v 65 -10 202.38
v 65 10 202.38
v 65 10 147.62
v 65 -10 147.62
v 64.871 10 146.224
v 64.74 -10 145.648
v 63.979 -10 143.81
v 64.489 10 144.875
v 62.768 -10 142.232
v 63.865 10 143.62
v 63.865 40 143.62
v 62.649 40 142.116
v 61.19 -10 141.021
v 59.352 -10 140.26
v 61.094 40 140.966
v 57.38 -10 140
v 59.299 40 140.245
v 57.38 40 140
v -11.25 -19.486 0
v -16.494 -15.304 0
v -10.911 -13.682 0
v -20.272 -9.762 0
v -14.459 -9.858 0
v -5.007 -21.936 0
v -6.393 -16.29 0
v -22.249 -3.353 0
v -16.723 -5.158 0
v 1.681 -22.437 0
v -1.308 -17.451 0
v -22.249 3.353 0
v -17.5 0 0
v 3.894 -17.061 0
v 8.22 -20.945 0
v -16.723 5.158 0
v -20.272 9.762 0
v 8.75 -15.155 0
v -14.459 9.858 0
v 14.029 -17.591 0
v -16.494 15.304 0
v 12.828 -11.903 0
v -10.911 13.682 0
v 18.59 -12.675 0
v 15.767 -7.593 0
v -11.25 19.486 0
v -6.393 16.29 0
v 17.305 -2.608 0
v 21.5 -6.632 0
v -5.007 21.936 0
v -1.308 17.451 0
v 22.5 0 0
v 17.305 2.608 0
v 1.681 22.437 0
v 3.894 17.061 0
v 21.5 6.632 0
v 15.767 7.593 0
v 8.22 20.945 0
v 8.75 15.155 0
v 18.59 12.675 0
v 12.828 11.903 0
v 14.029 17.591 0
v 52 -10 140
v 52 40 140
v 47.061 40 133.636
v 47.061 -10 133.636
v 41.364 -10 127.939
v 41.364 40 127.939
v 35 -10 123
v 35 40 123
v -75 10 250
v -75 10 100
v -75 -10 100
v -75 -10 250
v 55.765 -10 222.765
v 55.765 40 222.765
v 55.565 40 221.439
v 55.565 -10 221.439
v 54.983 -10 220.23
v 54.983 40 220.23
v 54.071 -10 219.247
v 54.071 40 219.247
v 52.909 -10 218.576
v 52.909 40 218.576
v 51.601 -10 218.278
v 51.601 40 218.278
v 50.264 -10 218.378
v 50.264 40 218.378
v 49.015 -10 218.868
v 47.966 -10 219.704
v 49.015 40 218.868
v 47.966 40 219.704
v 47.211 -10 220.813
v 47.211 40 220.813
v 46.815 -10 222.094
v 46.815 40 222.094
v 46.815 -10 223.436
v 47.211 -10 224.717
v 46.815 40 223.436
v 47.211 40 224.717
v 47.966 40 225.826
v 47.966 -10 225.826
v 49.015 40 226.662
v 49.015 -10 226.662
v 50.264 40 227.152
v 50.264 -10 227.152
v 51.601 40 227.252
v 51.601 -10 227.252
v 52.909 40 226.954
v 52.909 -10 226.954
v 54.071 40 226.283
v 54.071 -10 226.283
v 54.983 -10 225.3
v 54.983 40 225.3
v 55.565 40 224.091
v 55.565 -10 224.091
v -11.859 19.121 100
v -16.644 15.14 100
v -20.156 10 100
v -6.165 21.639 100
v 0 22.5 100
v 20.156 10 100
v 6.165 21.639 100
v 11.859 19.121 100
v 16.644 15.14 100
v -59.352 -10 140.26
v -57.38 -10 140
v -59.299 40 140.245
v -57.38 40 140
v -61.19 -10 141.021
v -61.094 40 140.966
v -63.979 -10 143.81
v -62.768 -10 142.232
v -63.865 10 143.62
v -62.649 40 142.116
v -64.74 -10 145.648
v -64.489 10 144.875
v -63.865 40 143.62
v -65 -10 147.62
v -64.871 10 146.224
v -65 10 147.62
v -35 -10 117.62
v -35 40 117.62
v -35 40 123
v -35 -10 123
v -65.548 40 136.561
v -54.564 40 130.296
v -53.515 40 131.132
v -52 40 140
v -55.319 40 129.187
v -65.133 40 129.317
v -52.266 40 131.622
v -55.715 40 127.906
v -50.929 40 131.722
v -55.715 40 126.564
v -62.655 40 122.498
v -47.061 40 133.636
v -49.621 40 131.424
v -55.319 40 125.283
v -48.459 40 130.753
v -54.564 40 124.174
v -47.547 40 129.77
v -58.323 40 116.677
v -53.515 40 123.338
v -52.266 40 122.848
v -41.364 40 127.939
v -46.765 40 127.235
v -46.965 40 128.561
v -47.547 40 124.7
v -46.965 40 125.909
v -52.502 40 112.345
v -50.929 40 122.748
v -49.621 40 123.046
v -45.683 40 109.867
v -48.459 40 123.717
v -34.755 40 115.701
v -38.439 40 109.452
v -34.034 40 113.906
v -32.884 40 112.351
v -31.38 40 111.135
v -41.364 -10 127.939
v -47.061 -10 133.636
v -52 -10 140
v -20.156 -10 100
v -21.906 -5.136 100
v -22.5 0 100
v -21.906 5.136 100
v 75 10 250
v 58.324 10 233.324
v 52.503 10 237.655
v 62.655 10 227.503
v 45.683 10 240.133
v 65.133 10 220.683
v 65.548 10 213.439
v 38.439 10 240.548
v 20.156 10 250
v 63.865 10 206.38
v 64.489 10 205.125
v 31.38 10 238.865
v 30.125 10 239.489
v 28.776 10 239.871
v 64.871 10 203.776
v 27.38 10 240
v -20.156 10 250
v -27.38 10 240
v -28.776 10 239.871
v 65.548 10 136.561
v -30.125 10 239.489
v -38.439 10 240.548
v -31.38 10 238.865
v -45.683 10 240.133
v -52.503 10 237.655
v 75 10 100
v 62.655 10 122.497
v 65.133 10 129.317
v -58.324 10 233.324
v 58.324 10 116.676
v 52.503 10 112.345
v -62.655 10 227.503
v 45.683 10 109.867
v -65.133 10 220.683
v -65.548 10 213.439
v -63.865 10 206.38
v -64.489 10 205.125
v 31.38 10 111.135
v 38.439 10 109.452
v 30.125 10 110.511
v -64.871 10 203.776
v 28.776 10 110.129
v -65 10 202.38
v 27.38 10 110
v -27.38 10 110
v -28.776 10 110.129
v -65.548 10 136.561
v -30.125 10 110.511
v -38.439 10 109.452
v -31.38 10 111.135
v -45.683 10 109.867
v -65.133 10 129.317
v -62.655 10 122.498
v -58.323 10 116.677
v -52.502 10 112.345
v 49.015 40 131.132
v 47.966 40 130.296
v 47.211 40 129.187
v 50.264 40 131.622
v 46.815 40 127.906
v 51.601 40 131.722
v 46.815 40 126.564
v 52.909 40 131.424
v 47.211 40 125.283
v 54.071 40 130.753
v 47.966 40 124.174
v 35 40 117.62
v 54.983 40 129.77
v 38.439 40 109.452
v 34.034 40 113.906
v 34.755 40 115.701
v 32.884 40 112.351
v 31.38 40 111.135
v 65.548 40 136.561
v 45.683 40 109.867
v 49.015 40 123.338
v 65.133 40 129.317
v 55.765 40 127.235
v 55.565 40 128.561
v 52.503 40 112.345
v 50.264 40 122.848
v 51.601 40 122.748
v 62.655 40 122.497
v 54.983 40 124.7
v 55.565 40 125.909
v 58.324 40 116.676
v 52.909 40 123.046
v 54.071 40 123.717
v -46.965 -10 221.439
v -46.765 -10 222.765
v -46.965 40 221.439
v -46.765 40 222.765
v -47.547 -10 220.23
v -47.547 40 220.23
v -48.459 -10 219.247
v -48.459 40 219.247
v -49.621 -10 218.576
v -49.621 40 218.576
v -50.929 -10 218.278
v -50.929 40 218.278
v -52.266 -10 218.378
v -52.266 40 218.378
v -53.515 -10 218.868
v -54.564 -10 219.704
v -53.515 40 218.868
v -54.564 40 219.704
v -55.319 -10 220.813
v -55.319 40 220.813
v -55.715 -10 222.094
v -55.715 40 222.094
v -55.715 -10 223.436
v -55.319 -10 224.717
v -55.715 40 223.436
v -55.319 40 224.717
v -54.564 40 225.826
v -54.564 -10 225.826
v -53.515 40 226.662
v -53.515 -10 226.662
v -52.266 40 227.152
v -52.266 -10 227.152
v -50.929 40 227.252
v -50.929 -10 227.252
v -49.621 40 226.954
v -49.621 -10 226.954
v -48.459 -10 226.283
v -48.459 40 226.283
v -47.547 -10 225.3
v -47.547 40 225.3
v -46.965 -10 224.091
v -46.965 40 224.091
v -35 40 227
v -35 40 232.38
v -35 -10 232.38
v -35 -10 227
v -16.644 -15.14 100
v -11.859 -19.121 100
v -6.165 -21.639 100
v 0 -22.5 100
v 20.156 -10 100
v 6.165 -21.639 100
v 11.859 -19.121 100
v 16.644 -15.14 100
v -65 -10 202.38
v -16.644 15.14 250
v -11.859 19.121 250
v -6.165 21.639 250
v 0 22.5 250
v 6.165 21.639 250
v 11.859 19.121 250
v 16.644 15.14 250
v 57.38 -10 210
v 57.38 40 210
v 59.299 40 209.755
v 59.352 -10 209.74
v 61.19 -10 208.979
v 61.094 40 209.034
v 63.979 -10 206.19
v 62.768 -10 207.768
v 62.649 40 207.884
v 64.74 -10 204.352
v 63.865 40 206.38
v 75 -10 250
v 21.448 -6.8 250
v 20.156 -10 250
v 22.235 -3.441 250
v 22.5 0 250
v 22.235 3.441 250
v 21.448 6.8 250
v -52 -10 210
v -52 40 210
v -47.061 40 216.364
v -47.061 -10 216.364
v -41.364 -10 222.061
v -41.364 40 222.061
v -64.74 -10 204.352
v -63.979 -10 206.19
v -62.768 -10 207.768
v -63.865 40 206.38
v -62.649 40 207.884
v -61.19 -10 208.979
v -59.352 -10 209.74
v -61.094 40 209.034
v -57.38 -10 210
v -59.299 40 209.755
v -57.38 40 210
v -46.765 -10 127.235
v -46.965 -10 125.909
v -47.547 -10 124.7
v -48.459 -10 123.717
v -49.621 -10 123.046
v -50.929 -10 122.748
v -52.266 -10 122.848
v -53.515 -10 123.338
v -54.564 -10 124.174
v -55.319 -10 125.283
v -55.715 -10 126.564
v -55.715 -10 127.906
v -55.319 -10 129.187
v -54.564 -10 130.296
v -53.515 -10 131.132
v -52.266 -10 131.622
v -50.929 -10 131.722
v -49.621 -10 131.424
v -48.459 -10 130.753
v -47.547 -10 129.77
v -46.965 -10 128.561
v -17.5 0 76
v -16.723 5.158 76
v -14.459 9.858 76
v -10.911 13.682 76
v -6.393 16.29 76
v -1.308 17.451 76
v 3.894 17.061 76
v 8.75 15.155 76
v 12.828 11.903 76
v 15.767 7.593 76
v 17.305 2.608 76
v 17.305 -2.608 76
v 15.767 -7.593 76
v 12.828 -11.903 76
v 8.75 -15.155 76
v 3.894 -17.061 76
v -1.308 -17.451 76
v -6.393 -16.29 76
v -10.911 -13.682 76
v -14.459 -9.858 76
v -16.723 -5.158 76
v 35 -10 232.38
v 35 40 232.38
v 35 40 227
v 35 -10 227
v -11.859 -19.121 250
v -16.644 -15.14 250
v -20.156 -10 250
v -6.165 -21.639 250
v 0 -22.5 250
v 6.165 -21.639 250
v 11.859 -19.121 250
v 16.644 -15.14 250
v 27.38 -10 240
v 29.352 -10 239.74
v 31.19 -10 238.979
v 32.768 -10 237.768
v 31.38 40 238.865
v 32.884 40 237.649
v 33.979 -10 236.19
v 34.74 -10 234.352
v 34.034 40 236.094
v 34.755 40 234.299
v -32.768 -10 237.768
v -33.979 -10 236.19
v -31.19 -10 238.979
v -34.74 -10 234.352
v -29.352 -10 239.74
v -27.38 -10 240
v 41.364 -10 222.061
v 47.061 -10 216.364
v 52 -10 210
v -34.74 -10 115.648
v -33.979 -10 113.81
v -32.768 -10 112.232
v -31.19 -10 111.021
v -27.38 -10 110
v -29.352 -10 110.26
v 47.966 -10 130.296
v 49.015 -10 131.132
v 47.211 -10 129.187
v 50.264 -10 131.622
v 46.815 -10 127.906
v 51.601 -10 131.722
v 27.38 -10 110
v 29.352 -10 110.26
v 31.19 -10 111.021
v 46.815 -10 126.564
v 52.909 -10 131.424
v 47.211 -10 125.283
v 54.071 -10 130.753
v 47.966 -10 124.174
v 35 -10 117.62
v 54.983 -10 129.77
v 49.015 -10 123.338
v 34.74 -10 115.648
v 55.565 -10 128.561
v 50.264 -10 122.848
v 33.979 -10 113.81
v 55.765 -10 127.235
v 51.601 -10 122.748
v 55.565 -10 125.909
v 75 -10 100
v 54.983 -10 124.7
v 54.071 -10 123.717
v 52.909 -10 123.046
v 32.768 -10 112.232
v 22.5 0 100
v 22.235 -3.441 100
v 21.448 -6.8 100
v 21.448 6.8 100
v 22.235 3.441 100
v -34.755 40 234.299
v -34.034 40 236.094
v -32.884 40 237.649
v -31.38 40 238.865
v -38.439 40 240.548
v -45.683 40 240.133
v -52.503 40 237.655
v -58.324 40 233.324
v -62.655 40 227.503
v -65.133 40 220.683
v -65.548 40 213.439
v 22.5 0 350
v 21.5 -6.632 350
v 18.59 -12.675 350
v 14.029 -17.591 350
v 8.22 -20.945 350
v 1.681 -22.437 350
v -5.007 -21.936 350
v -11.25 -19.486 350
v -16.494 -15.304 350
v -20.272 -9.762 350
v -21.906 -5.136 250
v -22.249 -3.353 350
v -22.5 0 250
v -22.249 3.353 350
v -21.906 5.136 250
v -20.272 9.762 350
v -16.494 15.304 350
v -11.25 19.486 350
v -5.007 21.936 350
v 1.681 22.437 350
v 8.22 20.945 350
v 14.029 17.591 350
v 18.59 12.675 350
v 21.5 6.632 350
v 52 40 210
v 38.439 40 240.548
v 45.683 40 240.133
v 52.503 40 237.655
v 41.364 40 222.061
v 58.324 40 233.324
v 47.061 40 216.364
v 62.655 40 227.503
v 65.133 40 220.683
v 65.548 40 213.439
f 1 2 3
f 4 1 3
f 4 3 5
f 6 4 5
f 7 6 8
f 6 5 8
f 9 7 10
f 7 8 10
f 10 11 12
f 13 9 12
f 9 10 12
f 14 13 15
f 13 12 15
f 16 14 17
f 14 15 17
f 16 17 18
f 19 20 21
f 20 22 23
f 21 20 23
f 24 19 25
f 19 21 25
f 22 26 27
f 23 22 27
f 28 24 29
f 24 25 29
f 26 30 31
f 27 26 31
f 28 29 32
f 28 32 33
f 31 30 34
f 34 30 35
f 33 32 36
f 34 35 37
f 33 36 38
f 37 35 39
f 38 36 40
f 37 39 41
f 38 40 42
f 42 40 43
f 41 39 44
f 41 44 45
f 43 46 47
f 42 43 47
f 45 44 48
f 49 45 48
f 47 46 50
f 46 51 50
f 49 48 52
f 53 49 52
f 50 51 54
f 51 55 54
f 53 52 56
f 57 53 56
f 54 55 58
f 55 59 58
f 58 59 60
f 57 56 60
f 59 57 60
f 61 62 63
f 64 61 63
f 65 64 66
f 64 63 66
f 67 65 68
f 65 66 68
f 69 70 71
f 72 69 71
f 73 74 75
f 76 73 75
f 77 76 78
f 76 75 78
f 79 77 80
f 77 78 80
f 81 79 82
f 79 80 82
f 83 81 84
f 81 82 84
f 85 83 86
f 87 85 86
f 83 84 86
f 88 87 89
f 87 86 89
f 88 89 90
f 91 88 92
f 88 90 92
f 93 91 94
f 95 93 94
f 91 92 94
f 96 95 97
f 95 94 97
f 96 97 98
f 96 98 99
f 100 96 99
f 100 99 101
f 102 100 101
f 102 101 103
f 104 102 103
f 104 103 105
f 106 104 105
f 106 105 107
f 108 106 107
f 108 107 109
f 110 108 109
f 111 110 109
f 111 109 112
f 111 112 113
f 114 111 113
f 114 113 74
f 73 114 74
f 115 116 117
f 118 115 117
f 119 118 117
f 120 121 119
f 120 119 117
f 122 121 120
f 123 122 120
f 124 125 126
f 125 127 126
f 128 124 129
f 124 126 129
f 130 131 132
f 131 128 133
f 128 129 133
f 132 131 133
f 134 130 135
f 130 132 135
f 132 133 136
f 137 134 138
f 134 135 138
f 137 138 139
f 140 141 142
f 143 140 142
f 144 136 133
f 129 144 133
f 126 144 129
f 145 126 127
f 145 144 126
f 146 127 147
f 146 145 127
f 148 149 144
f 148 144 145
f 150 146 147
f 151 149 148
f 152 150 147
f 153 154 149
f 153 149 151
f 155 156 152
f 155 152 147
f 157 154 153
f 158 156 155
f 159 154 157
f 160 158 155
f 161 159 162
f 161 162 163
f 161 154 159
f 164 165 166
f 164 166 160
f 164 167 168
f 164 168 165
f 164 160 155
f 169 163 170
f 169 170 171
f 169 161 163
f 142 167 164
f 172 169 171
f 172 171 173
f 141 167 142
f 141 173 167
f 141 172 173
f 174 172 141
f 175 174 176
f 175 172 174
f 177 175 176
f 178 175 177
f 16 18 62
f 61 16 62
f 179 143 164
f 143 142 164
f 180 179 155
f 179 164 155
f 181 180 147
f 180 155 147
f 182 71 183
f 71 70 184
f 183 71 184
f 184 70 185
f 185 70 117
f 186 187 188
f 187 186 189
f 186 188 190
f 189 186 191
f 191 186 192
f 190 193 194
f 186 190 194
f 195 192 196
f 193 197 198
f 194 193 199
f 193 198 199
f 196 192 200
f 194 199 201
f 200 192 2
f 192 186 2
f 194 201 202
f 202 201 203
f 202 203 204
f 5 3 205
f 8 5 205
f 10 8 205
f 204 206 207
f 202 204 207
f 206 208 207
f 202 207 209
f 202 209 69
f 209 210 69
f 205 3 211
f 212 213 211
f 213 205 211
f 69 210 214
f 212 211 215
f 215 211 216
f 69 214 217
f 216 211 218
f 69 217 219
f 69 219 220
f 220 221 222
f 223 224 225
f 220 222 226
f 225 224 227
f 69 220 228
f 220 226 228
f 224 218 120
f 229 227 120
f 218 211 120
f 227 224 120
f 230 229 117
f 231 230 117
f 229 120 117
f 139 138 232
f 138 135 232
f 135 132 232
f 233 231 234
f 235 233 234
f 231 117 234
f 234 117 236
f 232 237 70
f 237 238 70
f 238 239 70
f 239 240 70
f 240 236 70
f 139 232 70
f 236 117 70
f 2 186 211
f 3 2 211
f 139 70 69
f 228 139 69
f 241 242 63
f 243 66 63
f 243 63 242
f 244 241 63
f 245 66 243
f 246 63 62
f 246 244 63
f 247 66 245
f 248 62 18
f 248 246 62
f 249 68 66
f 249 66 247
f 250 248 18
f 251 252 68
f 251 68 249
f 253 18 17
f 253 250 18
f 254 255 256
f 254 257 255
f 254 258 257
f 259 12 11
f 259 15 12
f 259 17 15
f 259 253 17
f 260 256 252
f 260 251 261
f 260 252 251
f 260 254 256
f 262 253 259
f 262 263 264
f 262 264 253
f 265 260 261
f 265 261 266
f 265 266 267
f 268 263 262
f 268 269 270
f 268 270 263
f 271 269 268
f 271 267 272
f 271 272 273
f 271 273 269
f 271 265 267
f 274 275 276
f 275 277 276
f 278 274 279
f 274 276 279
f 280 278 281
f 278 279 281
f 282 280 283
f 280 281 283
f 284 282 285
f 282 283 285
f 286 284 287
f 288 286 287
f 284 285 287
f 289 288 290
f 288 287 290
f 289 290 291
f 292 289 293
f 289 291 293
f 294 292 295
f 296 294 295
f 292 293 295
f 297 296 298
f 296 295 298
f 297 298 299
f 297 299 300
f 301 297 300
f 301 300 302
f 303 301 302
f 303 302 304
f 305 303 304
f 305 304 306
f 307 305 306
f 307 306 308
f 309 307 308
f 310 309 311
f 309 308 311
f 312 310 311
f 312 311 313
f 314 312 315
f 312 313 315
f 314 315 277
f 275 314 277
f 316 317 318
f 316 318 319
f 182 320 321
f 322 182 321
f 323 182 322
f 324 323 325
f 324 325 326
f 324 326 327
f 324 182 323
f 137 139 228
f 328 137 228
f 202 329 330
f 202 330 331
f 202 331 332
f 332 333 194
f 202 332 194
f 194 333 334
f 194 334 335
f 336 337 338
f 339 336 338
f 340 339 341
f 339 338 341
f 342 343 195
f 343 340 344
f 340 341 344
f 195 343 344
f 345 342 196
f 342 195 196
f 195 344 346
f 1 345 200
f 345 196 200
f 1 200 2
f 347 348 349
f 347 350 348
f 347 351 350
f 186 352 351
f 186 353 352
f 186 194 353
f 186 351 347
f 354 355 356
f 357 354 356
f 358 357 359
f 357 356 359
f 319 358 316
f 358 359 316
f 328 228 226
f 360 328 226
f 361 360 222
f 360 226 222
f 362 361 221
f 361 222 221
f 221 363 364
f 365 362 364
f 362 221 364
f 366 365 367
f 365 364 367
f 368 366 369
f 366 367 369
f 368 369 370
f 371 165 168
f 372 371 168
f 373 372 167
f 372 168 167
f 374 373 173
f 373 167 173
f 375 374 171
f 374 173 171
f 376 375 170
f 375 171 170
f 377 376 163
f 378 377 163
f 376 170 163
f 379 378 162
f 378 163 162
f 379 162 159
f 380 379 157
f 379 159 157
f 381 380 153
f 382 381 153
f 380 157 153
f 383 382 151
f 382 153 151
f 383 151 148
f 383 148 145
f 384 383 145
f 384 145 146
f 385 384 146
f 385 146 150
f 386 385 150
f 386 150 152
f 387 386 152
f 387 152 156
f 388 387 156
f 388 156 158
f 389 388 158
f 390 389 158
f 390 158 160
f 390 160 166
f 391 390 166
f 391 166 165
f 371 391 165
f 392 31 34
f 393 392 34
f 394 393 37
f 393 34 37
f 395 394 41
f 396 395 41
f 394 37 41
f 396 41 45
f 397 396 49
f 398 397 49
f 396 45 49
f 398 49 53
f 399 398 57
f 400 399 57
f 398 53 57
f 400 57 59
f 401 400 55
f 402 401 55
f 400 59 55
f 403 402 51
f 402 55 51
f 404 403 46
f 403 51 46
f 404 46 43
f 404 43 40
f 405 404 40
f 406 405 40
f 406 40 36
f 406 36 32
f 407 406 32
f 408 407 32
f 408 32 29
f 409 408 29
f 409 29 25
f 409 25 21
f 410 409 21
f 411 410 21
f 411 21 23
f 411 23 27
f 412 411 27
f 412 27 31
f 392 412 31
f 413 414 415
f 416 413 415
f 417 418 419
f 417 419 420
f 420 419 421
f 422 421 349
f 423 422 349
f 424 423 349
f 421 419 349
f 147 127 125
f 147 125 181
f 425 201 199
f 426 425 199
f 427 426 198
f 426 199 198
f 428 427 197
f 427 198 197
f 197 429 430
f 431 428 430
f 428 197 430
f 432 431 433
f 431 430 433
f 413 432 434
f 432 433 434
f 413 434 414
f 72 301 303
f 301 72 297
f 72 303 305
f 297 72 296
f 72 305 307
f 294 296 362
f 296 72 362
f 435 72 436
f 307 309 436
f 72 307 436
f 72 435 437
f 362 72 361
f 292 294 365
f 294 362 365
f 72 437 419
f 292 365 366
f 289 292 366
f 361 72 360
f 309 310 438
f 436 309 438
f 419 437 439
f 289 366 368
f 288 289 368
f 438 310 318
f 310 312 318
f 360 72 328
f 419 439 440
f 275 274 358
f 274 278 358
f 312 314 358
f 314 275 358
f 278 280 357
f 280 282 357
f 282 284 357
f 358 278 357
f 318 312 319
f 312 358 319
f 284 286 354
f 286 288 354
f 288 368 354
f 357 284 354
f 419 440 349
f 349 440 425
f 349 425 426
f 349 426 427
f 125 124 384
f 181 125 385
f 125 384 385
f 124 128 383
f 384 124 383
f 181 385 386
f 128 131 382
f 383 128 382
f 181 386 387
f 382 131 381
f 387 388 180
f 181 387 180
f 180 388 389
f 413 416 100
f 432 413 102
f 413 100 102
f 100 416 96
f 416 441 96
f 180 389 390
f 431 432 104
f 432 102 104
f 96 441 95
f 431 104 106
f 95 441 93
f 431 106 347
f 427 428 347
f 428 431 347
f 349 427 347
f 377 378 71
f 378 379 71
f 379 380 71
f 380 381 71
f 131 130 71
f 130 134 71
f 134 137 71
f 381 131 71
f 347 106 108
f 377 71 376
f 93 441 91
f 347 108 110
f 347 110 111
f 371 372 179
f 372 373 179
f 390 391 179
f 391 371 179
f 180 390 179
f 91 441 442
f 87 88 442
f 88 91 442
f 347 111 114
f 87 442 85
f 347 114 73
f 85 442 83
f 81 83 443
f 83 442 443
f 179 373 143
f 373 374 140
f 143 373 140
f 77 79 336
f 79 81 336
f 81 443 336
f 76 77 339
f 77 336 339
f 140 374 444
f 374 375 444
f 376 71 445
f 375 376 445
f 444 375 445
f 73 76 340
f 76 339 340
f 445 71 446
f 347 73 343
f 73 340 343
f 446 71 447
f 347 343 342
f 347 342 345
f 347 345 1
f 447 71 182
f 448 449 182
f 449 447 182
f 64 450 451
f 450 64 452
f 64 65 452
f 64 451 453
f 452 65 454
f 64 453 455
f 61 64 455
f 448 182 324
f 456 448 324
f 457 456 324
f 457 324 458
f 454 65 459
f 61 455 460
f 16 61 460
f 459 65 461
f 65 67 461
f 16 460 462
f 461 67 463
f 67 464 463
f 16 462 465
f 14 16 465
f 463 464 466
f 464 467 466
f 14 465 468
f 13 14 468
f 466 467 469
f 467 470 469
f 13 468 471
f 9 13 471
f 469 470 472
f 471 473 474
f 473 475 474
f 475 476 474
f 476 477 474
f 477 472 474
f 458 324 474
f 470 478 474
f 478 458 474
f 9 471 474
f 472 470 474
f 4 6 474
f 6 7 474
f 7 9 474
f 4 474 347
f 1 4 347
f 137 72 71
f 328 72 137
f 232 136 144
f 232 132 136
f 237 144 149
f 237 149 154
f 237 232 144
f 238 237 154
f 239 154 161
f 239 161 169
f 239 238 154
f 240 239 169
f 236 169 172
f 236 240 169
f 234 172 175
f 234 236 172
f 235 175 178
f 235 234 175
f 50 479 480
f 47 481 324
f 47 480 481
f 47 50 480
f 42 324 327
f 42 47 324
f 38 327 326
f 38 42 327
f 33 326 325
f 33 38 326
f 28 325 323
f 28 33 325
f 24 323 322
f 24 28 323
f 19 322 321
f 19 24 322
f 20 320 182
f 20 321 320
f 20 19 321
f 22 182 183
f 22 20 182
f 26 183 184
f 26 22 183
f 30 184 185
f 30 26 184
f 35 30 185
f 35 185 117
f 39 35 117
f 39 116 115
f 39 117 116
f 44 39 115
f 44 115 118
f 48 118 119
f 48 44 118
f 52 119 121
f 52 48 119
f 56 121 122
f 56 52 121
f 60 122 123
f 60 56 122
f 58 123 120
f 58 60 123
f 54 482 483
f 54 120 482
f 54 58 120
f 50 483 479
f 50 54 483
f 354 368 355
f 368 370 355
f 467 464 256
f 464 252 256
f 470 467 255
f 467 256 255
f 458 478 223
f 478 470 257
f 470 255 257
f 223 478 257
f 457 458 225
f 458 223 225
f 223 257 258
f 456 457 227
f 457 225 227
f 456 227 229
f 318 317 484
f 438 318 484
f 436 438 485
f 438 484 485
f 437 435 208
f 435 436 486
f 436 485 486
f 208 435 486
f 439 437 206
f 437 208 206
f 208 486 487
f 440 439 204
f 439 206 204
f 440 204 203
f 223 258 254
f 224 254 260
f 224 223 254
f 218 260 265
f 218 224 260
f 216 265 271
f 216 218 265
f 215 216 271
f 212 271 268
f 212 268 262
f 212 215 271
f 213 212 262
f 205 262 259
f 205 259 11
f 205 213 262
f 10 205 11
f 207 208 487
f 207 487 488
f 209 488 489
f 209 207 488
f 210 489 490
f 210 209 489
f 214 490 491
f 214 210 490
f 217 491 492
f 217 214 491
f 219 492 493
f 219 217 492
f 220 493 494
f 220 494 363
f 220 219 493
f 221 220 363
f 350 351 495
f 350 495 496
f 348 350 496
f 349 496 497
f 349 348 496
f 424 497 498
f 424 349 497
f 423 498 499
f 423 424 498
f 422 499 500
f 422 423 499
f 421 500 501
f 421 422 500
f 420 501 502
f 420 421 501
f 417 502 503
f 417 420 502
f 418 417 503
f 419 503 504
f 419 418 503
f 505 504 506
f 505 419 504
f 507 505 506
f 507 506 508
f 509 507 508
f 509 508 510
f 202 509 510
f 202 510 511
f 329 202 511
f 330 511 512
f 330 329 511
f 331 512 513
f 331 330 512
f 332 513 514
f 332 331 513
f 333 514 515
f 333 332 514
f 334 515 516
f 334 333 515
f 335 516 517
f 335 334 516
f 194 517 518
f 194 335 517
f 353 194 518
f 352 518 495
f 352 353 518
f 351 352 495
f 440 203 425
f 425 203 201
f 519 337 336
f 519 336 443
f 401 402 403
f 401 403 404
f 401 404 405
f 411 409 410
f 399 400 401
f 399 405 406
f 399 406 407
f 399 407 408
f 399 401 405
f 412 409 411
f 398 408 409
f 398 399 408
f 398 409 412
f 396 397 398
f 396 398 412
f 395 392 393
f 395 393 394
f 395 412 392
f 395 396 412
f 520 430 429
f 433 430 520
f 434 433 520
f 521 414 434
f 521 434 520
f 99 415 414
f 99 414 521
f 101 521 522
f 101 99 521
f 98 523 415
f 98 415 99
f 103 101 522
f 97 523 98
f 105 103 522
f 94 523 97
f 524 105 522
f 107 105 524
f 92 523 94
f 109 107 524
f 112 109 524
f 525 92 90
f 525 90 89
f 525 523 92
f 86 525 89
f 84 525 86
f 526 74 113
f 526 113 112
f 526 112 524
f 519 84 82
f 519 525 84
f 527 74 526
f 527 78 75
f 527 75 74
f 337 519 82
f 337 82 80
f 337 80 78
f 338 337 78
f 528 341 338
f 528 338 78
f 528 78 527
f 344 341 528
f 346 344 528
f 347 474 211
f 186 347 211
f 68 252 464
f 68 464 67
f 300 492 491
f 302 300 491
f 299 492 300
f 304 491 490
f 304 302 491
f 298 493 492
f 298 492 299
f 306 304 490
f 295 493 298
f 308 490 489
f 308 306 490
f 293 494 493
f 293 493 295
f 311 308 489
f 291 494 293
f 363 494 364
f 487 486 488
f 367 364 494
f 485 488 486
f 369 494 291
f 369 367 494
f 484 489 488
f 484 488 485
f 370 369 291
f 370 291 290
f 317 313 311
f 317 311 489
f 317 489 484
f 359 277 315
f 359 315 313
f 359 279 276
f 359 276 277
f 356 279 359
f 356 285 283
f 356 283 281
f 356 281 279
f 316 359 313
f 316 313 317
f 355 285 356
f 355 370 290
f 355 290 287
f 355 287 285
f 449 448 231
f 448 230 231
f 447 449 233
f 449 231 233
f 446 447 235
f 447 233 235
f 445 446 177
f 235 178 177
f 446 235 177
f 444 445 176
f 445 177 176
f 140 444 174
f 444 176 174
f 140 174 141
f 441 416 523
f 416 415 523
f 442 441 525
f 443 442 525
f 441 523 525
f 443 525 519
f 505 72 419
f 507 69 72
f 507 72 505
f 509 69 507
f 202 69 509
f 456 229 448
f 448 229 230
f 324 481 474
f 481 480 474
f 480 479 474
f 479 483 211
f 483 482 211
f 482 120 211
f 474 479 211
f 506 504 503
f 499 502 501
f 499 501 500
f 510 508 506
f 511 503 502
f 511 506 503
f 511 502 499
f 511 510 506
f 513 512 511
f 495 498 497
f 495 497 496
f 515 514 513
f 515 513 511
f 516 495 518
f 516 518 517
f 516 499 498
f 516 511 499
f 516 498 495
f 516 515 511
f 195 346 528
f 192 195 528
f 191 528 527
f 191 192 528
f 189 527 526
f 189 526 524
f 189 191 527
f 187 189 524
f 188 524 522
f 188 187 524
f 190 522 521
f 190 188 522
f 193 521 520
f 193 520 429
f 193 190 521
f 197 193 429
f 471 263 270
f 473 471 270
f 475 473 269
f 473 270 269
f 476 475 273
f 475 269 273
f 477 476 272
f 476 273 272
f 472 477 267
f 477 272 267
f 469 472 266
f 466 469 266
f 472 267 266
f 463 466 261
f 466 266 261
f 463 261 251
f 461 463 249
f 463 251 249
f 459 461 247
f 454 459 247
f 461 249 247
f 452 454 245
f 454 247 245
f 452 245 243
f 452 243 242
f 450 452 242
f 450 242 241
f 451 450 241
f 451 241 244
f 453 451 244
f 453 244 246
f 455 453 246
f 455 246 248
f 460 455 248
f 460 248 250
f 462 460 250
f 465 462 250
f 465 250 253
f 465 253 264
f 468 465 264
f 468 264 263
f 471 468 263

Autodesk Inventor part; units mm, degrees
ref_plane "YZ Plane" through (0, 0, 0) normal (1, 0, 0) x (0, 1, 0)
ref_plane "XZ Plane" through (0, 0, 0) normal (0, 1, 0) x (-1, 0, 0)
ref_plane "XY Plane" through (0, 0, 0) normal (0, 0, 1) x (1, 0, 0)
sketch "Sketch1" plane through (0, 0, 0) normal (0, 0, 1) x (1, 0, 0)
  circle A0 centre (0, 0) radius 22.5
  dimension "d0" = 45
extrude "Extrusion1" add sketch "Sketch1" along normal blind 100
sketch "Sketch2" plane through (0, 0, 0) normal (0, 0, -1) x (-1, 0, 0)
  circle A0 centre (0, 0) radius 17.5
  point P0 (-6.0869, 16.4073)
  point P1 (4.042, 17.0268)
  point P2 (5, 16.7705)
  point P3 (-5, 16.7705)
  dimension "d3" = 35
sketch "Sketch5" plane through (0, 0, 100) normal (0, 0, 1) x (1, 0, 0)
  line L0 (-75, -10) -> (75, -10)
  line L1 (75, -10) -> (75, 10)
  line L2 (75, 10) -> (-75, 10)
  line L3 (-75, 10) -> (-75, -10)
  line L4 (-75, -10) -> (75, 10) construction
  line L5 (75, -10) -> (-75, 10) construction
  point P0 (0, 0)
  dimension "d32" = 150
  dimension "d33" = 20
extrude "Extrusion5" add sketch "Sketch5" along normal blind 150
sketch "Sketch8" plane through (0, 0, 250) normal (0, 0, 1) x (1, 0, 0)
  circle A0 centre (0, 0) radius 22.5
  dimension "d136" = 45
extrude "Extrusion8" add sketch "Sketch8" along normal blind 100
sketch "Sketch11" plane through (-20.1556, 10, 100) normal (0, 1, 0) x (1, 0, 0)
  line L0 (-44.8444, -140) -> (85.1556, -140)
  line L1 (85.1556, -140) -> (85.1556, -10)
  line L2 (85.1556, -10) -> (-44.8444, -10)
  line L3 (-44.8444, -10) -> (-44.8444, -140)
  line L4 (-44.8444, -140) -> (85.1556, -10) construction
  line L5 (85.1556, -140) -> (-44.8444, -10) construction
  line L6 (-54.8444, 0) -> (-54.8444, -150) projected
  line L7 (0, -150) -> (40.3113, -150) projected
  line L8 (-54.8444, -127.249) -> (-44.8444, -127.249)
  line L9 (-54.8444, -150) -> (0, -150) projected
  line L10 (-32.0934, -150) -> (-32.0934, -140)
  line L11 (-54.8444, 0) -> (-54.8444, -150) projected
  line L12 (-54.8444, -22.751) -> (-44.8444, -22.751)
  line L13 (-32.0934, 0) -> (-32.0934, -10)
  line L14 (0, 0) -> (40.3113, 0) projected
  line L15 (72.4046, 0) -> (72.4046, -10)
  line L16 (95.1556, -22.751) -> (85.1556, -22.751)
  line L17 (40.3113, -150) -> (95.1556, -150) projected
  line L18 (72.4046, -150) -> (72.4046, -140)
  line L19 (95.1556, 0) -> (95.1556, -150) projected
  line L20 (95.1556, -127.249) -> (85.1556, -127.249)
  line L21 (-44.8444, -75) -> (-44.8444, -40)
  line L22 (-44.8444, -75) -> (-44.8444, -110)
  line L23 (-44.8444, -40) -> (-31.8444, -40)
  line L24 (20.1556, -10) -> (-14.8444, -10)
  line L25 (20.1556, -10) -> (55.1556, -10)
  line L26 (-14.8444, -10) -> (-14.8444, -23)
  arc A0 (-14.8444, -23) -> (-31.8444, -40) centre (21.321, -76.1654) ccw
  line L27 (20.1556, -140) -> (-14.8444, -140)
  line L28 (20.1556, -140) -> (55.1556, -140)
  line L29 (85.1556, -75) -> (85.1556, -110)
  line L30 (85.1556, -75) -> (85.1556, -40)
  line L31 (20.1556, -10) -> (55.1556, -10)
  line L32 (-44.8444, -110) -> (-31.8444, -110)
  line L33 (-14.8444, -140) -> (-14.8444, -127)
  line L34 (55.1556, -140) -> (55.1556, -127)
  line L35 (85.1556, -110) -> (72.1556, -110)
  line L36 (85.1556, -40) -> (72.1556, -40)
  line L37 (55.1556, -10) -> (55.1556, -23)
  arc A1 (55.1556, -127) -> (72.1556, -110) centre (18.9903, -73.8346) ccw
  arc A2 (-31.8444, -110) -> (-14.8444, -127) centre (21.321, -73.8346) ccw
  arc A3 (72.1556, -40) -> (55.1556, -23) centre (18.9903, -76.1654) ccw
  point P0 (20.1556, 100)
  point P1 (20.1556, -75)
  dimension "d72" = 130
  dimension "d73" = 130
  dimension "d74" = 75
  dimension "d75" = 75
  dimension "d84" = 35
  dimension "d85" = 35
  dimension "d86" = 13
  dimension "d87" = 35
  dimension "d88" = 35
  dimension "d89" = 13
  dimension "d90" = 64.3
  dimension "d96" = 35
  dimension "d97" = 35
  dimension "d98" = 35
  dimension "d99" = 35
  dimension "d100" = 13
  dimension "d101" = 13
  dimension "d102" = 13
  dimension "d103" = 13
  dimension "d104" = 13
  dimension "d105" = 13
  dimension "d106" = 64.3
  dimension "d107" = 64.3
  dimension "d108" = 64.3
extrude "Extrusion10" cut sketch "Sketch11" against normal blind 20 contours L33 A2 L32 L3 L23 A0 L26 L2 L37 A3 L36 L1 L35 A1 L34 L0
sketch "Sketch12" plane through (-20.1556, 10, 100) normal (0, 1, 0) x (1, 0, 0)
  circle A0 centre (-31.1094, -27.235) radius 4.5
  line L0 (-44.8444, -40) -> (-31.8444, -40) projected
  line L1 (-44.8444, -110) -> (-44.8444, -40) projected
  circle A1 centre (-31.1094, -122.765) radius 4.5
  circle A2 centre (71.4206, -122.765) radius 4.5
  circle A3 centre (71.4206, -27.235) radius 4.5
  line L2 (-31.8444, -110) -> (-44.8444, -110) projected
  line L3 (85.1556, -110) -> (72.1556, -110) projected
  line L4 (85.1556, -40) -> (85.1556, -110) projected
  line L5 (72.1556, -40) -> (85.1556, -40) projected
  point P0 (20.1556, 100)
  point P1 (-28.3394, -127.249)
  dimension "d91" = 9
  dimension "d92" = 12.765
  dimension "d93" = 13.735
  dimension "d109" = 9
  dimension "d110" = 9
  dimension "d111" = 9
  dimension "d112" = 12.765
  dimension "d113" = 13.735
  dimension "d114" = 12.765
  dimension "d115" = 13.735
  dimension "d116" = 13.735
  dimension "d117" = 12.765
extrude "Extrusion11" cut sketch "Sketch12" along normal mid plane 50
sketch "Sketch13" plane through (-20.1556, 10, 100) normal (0, 1, 0) x (1, 0, 0)
  line L0 (-44.8444, -110) -> (-44.8444, -40) projected
  line L1 (55.1556, -140) -> (-14.8444, -140) projected
  arc A0 (-44.8444, -110) -> (-14.8444, -140) centre (-20.4902, -115.6459) ccw
  line L2 (-14.8444, -10) -> (-14.8444, -23) projected
  arc A1 (-14.8444, -10) -> (-44.8444, -40) centre (-20.4902, -34.3541) ccw
  line L3 (85.1556, -110) -> (85.1556, -40) projected
  arc A2 (55.1556, -140) -> (85.1556, -110) centre (60.8015, -115.6459) ccw
  line L4 (85.1556, -40) -> (72.1556, -40) projected
  line L5 (55.1556, -23) -> (55.1556, -10) projected
  arc A3 (85.1556, -40) -> (55.1556, -10) centre (60.8015, -34.3541) ccw
  line L6 (-14.8444, -127) -> (-14.8444, -140) projected
  line L7 (-14.8444, -140) -> (-14.8444, -127)
  arc A4 (-31.8444, -110) -> (-14.8444, -127) centre (21.321, -73.8346) ccw projected
  line L8 (-44.8444, -110) -> (-31.8444, -110)
  arc A5 (-31.8444, -110) -> (-14.8444, -127) centre (21.321, -73.8346) ccw
  line L9 (-31.8444, -40) -> (-44.8444, -40) projected
  line L10 (-44.8444, -40) -> (-31.8444, -40)
  line L11 (-14.8444, -10) -> (-14.8444, -23)
  line L12 (55.1556, -10) -> (55.1556, -23)
  line L13 (72.1556, -40) -> (85.1556, -40)
  line L14 (85.1556, -110) -> (72.1556, -110) projected
  line L15 (72.1556, -110) -> (85.1556, -110)
  arc A6 (-14.8444, -23) -> (-31.8444, -40) centre (21.321, -76.1654) ccw projected
  arc A7 (-14.8444, -23) -> (-31.8444, -40) centre (21.321, -76.1654) ccw
  arc A8 (72.1556, -40) -> (55.1556, -23) centre (18.9903, -76.1654) ccw
  line L16 (55.1556, -140) -> (55.1556, -127) projected
  line L17 (55.1556, -140) -> (55.1556, -127)
  arc A9 (55.1556, -127) -> (72.1556, -110) centre (18.9903, -73.8346) ccw projected
  arc A10 (55.1556, -127) -> (72.1556, -110) centre (18.9903, -73.8346) ccw
  point P0 (20.1556, 100)
  dimension "d118" = 25
  dimension "d119" = 25
  dimension "d120" = 25
  dimension "d121" = 25
  dimension "d122" = 64.3
  dimension "d125" = 64.3
  dimension "d126" = 64.3
  dimension "d127" = 64.3
extrude "Extrusion12" add sketch "Sketch13" along normal blind 30
sketch "Sketch14" plane through (-20.1556, -10, 100) normal (0, -1, 0) x (1, 0, 0)
  circle A0 centre (-31.1094, 27.235) radius 4.5 projected
  circle A1 centre (-31.1094, 27.235) radius 4.5
  circle A2 centre (-31.1094, 122.765) radius 4.5 projected
  circle A3 centre (-31.1094, 122.765) radius 4.5
  circle A4 centre (71.4206, 122.765) radius 4.5 projected
  circle A5 centre (71.4206, 122.765) radius 4.5
  circle A6 centre (71.4206, 27.235) radius 4.5 projected
  circle A7 centre (71.4206, 27.235) radius 4.5
  point P0 (20.1556, -100)
  dimension "d130" = 9
  dimension "d131" = 9
  dimension "d132" = 9
  dimension "d133" = 9
extrude "Extrusion13" cut sketch "Sketch14" against normal blind 100
extrude "Extrusion14" cut sketch "Sketch2" against normal blind 76
fillet "Fillet7" radius 7.62 8 edges at (65, 0, 210) (65, 0, 140) (35, 0, 110) (35, 0, 240) (-35, 0, 240) (-65, 0, 210) (-65, 0, 140) (-35, 0, 110)
equation "\"d84\" = d98"
equation "\"d85\" = d98"
equation "\"d86\" = d104"
equation "\"d87\" = d98"
equation "\"d88\" = d98"
equation "\"d89\" = d104"
equation "\"d96\" = d98"
equation "\"d97\" = d98"
equation "\"d99\" = d98"
equation "\"d100\" = d104"
equation "\"d101\" = d104"
equation "\"d102\" = d105"
equation "\"d103\" = d104"
equation "\"d112\" = d92"
equation "\"d113\" = d93"
equation "\"d114\" = d112"
equation "\"d115\" = d113"
equation "\"d116\" = d115"
equation "\"d117\" = d114"
properties part number "FrontPlateV2"
